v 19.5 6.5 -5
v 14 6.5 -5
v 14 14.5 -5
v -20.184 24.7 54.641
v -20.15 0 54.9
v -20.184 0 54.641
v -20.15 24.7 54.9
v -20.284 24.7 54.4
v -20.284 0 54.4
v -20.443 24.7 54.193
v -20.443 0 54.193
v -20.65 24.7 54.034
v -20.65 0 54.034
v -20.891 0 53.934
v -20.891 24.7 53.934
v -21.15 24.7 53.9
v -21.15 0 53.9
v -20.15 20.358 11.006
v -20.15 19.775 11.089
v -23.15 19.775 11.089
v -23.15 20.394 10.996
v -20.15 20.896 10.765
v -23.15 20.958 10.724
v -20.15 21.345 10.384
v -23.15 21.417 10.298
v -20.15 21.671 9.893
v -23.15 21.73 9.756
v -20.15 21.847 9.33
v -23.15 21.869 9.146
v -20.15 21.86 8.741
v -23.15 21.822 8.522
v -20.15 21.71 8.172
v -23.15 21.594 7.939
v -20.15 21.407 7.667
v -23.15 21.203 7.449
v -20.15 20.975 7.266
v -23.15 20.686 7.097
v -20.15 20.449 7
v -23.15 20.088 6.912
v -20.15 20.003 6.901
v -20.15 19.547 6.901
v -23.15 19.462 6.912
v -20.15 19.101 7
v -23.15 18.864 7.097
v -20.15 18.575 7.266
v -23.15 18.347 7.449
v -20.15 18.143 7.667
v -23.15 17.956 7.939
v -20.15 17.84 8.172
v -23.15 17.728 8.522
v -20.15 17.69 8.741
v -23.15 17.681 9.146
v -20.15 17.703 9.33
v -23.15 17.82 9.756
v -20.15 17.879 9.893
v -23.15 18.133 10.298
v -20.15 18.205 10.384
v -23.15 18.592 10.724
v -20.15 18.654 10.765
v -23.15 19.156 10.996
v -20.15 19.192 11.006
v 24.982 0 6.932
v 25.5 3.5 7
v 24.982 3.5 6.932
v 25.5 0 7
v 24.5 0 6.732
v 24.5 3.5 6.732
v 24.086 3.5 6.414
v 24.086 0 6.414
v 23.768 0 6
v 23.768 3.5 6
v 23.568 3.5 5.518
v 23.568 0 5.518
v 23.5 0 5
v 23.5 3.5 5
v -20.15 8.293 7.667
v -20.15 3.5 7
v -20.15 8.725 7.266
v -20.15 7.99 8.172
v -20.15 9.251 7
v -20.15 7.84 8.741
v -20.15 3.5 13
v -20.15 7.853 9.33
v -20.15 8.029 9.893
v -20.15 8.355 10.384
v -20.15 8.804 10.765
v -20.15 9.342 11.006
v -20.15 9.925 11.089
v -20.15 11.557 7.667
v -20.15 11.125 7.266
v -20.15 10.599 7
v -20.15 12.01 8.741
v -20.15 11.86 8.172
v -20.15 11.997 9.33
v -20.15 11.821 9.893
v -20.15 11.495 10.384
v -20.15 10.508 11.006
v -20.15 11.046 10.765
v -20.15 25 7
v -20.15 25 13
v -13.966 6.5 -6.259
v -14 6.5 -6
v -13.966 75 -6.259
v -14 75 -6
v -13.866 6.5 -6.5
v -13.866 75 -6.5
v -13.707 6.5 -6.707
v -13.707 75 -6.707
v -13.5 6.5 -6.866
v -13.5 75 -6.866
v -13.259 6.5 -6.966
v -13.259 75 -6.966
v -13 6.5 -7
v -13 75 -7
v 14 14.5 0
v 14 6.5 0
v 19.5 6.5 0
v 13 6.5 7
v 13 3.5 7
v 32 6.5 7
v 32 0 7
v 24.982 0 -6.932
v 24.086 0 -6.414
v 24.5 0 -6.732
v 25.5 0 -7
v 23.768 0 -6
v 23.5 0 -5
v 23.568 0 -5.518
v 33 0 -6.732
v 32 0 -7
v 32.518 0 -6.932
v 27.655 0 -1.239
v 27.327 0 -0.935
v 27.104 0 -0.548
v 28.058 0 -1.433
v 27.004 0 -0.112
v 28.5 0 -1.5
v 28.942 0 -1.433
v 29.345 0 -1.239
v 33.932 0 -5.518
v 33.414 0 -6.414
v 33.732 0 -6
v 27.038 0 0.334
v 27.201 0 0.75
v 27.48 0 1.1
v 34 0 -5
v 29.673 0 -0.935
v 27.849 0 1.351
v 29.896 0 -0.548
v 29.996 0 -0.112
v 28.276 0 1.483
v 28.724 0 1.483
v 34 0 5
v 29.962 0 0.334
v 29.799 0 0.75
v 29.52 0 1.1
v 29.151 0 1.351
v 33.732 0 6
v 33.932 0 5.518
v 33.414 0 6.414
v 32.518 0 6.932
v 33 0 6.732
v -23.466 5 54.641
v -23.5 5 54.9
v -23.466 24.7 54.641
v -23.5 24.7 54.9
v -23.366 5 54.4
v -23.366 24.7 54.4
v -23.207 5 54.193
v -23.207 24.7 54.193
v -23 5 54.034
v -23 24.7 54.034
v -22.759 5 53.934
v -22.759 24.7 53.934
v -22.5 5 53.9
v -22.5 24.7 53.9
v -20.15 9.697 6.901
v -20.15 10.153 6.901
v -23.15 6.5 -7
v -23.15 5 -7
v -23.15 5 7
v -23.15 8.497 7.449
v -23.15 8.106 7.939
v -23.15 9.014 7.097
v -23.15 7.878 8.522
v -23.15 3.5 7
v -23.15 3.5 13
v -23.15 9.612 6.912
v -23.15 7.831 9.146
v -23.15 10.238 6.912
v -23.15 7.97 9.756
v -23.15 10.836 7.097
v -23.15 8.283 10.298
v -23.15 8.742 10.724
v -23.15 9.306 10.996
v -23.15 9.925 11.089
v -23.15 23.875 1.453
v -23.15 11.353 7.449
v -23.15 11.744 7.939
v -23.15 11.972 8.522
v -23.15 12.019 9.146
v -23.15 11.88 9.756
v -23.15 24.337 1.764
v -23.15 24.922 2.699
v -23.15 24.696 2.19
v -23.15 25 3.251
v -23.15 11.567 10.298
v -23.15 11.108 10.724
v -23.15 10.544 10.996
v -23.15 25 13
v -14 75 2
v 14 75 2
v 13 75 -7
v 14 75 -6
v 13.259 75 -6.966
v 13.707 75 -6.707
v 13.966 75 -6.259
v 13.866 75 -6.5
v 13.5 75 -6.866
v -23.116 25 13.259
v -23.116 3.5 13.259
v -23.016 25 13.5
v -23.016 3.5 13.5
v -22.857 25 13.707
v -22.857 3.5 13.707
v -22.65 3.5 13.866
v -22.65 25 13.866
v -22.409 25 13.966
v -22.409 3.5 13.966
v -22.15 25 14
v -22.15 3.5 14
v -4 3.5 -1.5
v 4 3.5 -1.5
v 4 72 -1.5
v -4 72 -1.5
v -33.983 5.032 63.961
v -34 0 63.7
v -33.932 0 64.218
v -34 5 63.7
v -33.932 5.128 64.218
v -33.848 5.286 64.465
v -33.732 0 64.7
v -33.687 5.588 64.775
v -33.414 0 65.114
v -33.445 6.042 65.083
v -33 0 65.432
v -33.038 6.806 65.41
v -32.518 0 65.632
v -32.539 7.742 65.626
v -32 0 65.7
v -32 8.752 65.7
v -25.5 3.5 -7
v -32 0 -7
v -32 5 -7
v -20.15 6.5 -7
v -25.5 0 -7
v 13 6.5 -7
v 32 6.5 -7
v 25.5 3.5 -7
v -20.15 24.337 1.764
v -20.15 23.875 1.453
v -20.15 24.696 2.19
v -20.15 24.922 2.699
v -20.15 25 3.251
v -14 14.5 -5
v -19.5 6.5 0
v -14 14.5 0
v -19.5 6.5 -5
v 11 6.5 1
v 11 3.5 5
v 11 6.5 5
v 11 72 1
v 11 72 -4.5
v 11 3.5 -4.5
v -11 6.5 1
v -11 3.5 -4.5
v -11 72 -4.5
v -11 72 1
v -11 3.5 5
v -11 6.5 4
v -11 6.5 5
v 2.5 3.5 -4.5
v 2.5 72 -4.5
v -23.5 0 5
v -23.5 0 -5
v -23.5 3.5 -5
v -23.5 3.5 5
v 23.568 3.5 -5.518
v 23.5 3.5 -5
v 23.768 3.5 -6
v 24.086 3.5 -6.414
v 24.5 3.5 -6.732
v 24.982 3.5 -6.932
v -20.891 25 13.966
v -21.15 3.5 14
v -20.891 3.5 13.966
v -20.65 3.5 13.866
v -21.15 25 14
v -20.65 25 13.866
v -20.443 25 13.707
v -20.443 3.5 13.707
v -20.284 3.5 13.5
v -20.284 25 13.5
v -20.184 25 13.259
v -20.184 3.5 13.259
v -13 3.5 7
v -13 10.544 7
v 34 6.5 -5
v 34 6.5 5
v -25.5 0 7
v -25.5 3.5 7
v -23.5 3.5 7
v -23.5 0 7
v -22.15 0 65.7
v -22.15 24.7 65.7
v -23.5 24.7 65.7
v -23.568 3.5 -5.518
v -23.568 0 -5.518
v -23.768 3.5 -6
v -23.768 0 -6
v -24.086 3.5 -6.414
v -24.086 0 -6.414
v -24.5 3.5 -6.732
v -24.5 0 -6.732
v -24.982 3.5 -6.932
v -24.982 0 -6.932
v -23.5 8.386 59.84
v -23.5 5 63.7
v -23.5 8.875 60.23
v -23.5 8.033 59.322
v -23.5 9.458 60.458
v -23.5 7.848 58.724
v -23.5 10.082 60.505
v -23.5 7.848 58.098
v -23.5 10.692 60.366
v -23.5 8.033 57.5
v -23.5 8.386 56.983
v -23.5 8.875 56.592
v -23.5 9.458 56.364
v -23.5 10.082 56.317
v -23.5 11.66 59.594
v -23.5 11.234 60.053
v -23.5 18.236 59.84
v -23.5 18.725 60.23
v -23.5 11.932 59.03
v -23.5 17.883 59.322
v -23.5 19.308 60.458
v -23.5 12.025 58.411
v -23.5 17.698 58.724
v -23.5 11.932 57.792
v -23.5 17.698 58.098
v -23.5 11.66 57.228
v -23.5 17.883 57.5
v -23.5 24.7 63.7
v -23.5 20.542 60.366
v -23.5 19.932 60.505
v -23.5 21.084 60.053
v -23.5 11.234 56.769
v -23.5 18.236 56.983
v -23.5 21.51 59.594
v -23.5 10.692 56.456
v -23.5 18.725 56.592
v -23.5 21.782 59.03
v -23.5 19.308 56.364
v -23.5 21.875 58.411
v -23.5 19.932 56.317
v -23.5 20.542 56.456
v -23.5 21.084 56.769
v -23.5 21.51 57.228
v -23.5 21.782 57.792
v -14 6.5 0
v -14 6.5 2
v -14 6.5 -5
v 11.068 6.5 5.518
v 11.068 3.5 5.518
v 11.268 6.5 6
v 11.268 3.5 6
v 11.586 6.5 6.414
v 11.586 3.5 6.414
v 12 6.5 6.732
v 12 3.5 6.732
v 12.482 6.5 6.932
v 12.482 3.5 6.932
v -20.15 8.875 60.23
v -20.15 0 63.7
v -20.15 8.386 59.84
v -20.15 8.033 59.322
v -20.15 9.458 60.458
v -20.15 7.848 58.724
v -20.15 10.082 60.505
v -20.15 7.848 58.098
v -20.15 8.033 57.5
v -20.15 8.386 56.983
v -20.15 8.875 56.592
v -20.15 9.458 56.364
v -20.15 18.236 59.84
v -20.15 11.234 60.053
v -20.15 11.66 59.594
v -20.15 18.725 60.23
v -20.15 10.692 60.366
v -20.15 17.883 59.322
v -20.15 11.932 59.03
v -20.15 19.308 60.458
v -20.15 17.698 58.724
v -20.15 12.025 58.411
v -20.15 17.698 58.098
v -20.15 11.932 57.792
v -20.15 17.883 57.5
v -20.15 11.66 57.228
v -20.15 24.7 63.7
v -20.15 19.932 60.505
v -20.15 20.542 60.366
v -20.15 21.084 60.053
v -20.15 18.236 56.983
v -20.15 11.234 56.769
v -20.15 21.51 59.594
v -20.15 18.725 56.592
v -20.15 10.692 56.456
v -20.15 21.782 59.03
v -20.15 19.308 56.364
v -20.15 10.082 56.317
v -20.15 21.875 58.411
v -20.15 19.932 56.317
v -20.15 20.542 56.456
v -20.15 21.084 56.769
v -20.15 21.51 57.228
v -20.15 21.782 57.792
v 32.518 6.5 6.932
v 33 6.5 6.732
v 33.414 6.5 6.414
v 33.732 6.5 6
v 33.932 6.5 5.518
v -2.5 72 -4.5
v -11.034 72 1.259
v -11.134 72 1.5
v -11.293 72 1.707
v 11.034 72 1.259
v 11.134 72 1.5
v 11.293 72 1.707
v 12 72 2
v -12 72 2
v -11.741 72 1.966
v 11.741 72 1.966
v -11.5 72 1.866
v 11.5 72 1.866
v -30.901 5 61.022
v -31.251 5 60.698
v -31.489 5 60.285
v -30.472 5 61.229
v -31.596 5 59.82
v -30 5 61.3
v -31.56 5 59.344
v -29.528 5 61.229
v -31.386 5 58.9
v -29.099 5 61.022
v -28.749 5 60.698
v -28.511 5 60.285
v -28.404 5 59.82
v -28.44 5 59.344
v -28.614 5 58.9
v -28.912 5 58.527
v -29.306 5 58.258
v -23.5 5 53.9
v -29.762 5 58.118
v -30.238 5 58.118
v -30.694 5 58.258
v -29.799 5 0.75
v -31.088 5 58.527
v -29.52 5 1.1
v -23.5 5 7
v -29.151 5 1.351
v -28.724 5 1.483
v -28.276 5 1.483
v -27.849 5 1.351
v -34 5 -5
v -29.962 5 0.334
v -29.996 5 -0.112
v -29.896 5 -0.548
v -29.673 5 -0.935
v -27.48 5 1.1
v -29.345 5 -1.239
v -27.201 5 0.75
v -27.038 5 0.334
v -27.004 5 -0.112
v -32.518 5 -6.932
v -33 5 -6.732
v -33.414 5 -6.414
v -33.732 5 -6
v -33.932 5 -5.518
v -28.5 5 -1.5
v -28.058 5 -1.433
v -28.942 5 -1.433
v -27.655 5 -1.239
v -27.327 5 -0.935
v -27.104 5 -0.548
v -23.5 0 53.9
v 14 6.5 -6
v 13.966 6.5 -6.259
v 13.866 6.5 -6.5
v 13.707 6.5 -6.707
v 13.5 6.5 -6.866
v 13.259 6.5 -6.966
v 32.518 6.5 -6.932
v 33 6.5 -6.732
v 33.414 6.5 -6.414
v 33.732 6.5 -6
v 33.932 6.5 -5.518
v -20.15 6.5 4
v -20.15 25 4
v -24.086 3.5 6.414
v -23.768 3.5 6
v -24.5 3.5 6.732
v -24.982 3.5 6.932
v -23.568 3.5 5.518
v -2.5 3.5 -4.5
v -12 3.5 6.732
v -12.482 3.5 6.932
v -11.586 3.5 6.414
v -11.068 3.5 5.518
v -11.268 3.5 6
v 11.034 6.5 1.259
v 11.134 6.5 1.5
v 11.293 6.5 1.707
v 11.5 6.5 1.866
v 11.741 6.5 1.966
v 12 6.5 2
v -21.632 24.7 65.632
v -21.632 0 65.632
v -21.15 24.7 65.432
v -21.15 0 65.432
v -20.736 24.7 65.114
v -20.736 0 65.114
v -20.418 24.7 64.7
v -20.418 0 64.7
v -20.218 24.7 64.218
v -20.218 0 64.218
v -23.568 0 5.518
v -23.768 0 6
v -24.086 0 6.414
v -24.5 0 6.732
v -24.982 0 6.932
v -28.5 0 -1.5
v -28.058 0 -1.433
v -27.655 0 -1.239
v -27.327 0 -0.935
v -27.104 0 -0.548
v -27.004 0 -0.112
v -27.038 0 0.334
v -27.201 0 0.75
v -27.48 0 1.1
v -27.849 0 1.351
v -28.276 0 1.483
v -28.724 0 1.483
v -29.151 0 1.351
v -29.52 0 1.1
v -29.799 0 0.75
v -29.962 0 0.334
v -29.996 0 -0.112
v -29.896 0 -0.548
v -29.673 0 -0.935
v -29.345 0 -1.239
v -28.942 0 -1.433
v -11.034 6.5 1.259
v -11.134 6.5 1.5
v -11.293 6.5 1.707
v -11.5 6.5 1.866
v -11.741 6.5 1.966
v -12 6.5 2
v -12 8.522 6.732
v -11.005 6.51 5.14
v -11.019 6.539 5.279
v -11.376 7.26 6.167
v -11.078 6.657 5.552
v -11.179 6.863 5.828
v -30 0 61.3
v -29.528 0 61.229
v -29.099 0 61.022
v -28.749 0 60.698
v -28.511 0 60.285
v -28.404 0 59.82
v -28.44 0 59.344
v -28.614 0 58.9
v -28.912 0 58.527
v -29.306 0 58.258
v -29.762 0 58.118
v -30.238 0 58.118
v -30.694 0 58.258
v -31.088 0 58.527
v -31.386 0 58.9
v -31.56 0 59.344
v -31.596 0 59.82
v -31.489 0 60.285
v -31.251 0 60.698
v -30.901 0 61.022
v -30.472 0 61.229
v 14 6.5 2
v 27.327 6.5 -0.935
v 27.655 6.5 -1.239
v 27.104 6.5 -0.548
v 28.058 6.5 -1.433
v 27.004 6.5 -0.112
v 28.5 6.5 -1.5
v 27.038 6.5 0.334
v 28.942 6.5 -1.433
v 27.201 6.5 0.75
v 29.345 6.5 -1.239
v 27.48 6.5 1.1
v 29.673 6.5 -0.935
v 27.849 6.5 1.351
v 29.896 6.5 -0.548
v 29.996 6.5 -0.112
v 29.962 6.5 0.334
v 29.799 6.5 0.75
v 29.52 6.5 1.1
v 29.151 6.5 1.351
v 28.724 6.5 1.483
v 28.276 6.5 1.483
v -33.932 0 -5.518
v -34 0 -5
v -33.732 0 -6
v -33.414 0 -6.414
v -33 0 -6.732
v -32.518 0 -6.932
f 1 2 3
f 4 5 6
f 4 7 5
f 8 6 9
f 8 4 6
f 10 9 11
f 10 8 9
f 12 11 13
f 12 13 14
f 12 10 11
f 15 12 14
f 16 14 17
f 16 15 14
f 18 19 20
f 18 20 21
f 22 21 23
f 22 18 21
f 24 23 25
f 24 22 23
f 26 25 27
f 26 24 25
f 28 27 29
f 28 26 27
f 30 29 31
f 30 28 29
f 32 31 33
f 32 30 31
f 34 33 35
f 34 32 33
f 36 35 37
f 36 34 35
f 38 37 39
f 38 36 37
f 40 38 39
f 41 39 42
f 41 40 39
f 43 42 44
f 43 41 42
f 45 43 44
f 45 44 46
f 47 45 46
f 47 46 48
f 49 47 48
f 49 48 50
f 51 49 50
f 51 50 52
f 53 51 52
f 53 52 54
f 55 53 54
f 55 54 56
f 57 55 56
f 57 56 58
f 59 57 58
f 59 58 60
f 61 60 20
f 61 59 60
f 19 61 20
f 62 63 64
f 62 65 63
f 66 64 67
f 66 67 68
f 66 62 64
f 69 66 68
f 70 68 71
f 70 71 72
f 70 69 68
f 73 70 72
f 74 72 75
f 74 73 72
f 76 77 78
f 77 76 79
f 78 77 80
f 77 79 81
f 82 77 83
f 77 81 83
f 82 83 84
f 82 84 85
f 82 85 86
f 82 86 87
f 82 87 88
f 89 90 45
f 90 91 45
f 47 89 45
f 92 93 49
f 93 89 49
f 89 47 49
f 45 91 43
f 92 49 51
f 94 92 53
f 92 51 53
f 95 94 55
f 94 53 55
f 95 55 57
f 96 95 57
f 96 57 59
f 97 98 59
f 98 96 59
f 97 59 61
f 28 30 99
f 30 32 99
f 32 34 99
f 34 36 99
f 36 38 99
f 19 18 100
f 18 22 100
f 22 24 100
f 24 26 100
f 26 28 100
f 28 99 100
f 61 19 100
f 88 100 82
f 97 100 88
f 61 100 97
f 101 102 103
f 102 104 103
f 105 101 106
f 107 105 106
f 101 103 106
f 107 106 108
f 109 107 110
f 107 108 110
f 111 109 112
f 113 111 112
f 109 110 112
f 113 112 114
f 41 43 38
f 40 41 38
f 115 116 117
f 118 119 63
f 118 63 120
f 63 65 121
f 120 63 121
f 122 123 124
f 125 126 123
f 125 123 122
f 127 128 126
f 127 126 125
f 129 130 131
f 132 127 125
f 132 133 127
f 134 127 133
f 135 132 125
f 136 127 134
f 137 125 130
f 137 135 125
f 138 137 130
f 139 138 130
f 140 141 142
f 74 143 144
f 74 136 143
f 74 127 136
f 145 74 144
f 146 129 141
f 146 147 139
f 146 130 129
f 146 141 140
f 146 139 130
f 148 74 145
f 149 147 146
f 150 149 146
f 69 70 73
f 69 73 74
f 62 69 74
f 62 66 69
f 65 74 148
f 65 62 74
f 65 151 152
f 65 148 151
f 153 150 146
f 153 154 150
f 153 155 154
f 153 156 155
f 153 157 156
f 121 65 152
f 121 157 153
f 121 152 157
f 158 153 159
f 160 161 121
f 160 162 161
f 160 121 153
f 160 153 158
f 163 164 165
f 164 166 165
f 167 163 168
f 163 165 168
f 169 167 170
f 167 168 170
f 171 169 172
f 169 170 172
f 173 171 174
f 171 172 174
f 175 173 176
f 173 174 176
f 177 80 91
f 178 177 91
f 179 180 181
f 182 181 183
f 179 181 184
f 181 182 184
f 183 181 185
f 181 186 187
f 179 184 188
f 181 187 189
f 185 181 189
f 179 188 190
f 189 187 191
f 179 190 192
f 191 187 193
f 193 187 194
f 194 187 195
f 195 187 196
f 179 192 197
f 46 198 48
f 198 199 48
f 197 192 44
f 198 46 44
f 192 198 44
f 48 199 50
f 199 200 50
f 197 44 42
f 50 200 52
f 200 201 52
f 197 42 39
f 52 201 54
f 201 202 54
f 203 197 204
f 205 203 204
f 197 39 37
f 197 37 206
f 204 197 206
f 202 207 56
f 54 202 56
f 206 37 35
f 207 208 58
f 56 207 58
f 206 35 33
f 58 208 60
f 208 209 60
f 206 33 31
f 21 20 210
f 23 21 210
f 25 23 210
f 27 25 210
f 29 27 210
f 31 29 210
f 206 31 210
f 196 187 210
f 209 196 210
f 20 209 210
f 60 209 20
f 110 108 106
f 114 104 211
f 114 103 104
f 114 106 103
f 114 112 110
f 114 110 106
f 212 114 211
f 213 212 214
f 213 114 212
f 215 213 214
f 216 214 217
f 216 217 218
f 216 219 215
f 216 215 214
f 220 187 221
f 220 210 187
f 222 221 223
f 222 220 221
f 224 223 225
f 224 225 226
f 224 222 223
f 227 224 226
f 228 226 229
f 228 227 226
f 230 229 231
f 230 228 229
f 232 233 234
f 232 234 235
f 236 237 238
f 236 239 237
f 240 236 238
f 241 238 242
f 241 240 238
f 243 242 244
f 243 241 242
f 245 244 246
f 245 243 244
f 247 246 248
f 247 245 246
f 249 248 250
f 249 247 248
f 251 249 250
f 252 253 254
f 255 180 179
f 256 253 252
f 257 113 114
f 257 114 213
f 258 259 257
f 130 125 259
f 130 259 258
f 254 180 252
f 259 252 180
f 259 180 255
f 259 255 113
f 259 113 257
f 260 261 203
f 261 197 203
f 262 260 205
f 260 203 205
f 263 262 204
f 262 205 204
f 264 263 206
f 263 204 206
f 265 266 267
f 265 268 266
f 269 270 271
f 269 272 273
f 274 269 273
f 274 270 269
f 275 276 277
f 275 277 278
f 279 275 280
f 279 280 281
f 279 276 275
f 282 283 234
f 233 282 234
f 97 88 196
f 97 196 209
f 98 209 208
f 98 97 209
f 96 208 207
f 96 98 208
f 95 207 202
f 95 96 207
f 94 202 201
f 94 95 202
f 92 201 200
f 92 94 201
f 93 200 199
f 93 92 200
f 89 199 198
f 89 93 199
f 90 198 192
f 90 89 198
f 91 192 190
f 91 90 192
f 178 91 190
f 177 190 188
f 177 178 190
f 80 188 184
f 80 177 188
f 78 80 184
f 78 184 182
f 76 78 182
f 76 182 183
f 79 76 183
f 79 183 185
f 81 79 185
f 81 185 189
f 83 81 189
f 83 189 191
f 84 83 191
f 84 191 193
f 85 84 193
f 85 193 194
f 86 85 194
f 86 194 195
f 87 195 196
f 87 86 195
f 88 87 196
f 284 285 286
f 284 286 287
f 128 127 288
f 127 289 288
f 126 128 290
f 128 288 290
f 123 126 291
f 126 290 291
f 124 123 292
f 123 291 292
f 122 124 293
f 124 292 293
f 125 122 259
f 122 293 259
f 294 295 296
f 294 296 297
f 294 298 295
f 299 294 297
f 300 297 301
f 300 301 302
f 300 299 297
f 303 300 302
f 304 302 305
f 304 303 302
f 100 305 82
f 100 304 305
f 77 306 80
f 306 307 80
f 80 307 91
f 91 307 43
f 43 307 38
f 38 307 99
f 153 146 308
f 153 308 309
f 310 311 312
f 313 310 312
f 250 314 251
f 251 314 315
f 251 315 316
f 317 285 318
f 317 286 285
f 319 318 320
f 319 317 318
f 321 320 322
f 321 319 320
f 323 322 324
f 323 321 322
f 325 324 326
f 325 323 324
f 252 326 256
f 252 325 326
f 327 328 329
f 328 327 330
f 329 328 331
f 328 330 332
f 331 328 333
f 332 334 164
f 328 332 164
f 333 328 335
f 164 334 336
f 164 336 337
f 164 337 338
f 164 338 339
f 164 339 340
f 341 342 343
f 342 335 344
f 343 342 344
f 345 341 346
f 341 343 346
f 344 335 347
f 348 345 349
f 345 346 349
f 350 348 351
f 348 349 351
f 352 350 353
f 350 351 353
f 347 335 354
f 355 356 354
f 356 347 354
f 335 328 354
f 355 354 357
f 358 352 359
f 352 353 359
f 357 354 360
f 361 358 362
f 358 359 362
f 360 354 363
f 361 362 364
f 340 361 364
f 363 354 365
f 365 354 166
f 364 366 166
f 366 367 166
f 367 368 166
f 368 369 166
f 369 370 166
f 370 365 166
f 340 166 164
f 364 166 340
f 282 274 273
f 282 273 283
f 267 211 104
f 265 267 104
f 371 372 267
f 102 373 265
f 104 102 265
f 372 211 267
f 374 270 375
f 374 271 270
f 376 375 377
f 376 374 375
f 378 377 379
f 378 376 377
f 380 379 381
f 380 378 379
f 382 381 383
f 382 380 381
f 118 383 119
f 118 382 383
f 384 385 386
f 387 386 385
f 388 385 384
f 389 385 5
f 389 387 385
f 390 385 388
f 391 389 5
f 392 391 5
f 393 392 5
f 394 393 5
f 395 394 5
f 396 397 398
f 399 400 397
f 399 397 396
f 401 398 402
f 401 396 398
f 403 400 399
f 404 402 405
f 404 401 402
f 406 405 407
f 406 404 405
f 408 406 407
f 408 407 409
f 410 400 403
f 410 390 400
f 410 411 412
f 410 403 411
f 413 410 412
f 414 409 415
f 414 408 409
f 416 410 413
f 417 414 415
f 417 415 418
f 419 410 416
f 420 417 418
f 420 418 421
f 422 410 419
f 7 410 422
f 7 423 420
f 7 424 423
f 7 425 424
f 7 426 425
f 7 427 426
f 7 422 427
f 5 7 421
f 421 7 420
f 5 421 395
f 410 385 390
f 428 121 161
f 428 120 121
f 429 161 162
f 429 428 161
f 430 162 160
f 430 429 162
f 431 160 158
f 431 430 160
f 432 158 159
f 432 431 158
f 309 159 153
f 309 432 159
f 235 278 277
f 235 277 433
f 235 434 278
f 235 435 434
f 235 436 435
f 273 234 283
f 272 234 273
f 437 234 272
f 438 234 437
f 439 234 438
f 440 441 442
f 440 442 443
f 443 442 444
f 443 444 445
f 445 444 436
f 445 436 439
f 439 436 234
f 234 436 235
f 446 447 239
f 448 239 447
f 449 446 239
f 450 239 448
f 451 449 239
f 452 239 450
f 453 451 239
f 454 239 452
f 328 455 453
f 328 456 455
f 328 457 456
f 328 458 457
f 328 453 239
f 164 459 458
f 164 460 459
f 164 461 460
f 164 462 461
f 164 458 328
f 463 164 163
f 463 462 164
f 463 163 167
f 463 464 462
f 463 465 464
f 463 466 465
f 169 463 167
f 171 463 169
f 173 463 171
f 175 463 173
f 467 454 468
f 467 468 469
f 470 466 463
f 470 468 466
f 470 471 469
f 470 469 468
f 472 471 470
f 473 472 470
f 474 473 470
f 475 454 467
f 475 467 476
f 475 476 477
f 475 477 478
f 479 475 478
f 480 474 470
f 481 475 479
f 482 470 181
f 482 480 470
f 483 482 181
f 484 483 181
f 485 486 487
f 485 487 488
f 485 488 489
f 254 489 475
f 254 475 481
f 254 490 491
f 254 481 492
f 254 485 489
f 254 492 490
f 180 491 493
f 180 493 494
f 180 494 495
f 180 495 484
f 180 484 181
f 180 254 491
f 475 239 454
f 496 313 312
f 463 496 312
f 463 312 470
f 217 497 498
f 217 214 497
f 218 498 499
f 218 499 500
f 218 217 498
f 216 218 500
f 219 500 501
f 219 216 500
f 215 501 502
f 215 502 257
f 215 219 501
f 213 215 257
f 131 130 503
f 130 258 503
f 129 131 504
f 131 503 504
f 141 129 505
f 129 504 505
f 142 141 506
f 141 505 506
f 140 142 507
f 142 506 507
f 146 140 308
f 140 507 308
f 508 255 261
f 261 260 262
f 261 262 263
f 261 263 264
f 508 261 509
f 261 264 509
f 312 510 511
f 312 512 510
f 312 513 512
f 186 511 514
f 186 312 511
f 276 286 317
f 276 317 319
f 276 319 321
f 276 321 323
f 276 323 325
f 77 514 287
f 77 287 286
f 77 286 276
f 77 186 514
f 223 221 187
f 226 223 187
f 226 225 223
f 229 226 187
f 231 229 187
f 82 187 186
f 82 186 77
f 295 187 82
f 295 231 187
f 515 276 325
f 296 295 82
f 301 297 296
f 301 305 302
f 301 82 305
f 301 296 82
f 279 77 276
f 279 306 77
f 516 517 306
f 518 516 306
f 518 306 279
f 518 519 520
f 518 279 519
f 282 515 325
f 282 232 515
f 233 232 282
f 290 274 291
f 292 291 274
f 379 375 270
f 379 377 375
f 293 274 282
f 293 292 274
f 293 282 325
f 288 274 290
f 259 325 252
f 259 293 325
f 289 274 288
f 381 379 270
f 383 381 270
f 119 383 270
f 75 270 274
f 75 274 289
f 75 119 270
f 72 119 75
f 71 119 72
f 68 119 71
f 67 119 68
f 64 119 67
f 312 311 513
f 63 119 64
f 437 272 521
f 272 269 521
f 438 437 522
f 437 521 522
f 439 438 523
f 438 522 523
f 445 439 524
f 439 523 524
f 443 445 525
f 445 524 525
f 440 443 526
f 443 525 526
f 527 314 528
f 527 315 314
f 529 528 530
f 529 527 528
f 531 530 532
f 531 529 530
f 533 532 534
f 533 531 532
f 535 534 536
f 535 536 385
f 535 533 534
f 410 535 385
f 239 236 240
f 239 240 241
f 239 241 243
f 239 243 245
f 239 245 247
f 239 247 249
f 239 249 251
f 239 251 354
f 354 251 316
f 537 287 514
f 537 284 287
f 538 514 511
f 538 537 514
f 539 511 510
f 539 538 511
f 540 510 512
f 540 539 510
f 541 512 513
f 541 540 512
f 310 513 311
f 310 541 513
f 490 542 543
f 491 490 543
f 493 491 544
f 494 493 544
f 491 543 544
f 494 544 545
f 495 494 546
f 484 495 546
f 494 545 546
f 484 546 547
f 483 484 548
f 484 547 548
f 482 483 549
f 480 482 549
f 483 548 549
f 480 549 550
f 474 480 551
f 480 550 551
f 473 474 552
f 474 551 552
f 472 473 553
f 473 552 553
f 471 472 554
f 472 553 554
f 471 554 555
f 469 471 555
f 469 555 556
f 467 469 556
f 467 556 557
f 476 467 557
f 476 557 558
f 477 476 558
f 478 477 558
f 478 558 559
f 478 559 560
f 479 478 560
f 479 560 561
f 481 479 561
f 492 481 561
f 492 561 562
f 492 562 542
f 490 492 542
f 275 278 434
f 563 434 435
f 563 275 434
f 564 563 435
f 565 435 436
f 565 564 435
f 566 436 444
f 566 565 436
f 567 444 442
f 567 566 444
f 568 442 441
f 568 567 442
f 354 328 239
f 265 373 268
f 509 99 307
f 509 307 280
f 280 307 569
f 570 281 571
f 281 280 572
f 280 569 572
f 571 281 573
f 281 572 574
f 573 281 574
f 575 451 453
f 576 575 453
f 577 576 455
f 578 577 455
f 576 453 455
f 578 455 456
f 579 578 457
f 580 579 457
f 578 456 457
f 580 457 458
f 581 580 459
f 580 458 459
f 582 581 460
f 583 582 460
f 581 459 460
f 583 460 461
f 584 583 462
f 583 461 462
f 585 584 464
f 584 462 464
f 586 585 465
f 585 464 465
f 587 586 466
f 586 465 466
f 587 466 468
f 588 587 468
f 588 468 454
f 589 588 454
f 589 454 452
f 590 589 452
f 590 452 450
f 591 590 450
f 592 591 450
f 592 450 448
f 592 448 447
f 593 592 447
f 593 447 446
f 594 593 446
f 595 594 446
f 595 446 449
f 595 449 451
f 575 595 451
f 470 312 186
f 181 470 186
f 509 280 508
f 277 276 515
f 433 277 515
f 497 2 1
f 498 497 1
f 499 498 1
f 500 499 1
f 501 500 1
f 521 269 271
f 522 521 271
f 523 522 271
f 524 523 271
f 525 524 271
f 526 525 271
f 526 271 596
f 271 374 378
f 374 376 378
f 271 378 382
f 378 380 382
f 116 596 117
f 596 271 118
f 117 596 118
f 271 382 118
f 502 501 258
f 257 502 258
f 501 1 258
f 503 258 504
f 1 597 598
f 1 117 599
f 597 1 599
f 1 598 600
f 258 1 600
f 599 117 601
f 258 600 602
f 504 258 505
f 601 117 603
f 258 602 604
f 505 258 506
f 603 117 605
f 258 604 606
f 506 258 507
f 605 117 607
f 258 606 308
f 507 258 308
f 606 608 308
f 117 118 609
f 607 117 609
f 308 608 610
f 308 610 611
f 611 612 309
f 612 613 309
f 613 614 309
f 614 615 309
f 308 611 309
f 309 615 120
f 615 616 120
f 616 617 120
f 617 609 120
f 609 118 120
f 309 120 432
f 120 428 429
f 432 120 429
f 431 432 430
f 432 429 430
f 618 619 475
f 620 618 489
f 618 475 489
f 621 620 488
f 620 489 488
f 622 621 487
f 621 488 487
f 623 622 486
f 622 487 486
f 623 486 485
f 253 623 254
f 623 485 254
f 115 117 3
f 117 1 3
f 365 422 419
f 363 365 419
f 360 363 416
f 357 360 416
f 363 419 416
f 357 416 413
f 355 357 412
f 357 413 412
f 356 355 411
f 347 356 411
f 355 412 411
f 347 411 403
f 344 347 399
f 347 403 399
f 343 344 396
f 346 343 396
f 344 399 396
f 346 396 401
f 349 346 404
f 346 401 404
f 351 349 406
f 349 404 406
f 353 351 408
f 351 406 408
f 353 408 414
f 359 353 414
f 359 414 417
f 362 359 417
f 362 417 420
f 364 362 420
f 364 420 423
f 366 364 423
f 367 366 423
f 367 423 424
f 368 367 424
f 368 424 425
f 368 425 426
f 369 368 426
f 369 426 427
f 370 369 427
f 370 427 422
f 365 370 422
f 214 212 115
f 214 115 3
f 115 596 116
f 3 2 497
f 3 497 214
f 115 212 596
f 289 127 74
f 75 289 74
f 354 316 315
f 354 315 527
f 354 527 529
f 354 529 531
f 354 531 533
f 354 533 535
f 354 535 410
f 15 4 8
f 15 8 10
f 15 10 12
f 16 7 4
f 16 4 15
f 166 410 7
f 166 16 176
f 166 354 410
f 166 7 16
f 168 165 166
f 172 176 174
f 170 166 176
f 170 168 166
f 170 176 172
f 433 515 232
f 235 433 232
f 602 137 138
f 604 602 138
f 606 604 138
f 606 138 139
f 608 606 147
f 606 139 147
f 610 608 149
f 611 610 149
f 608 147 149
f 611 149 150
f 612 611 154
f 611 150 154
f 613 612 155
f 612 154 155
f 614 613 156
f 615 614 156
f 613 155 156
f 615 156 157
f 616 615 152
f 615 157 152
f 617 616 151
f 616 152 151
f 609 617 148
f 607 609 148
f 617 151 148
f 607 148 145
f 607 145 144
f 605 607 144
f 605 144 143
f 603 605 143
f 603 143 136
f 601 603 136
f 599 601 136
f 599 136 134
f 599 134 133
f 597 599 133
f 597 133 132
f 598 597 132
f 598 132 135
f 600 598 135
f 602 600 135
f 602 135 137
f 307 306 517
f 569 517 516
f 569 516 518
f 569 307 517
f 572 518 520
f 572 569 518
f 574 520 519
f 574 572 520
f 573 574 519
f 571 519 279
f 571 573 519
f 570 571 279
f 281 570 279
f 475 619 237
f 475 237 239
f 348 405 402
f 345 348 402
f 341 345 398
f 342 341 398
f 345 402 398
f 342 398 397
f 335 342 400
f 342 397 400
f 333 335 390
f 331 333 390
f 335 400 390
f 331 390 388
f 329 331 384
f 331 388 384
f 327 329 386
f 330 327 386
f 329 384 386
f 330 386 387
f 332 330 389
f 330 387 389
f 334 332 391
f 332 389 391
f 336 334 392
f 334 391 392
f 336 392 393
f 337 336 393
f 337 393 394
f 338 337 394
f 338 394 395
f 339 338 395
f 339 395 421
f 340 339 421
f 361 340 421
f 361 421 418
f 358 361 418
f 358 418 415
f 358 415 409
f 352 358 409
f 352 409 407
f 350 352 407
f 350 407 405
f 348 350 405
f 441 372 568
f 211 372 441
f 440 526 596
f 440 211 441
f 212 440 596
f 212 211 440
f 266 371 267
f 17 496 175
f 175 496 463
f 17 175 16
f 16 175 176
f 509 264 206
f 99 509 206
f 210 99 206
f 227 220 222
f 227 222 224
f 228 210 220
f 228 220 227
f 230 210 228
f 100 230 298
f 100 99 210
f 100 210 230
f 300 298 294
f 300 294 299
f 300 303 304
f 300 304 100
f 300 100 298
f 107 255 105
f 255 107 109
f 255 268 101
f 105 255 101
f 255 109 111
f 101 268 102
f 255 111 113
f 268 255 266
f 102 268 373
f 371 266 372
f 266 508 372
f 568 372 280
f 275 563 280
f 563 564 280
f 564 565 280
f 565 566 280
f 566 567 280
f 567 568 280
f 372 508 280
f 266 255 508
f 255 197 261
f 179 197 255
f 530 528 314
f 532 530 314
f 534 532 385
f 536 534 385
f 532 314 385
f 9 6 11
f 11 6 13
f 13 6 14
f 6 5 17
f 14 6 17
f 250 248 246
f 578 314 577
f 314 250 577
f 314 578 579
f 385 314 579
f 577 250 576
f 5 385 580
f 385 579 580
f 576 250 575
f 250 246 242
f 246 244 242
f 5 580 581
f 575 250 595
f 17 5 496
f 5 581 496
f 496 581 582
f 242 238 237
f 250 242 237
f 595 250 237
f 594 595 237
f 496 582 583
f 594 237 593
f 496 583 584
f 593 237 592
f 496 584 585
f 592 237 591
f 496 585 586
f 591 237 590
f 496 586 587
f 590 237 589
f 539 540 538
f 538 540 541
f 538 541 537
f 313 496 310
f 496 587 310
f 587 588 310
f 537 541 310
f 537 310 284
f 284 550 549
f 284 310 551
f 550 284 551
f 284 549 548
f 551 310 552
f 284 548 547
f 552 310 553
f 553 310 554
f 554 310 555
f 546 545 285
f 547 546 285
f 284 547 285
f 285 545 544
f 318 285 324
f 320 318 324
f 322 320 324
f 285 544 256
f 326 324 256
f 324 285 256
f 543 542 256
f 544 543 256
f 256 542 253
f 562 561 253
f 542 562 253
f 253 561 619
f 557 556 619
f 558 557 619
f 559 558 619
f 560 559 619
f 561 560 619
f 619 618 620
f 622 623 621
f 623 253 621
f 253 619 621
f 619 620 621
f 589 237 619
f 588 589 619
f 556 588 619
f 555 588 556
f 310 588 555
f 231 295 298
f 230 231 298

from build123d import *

# Parameters (mm, degrees)
SKETCH_1_W          = 28
SKETCH_1_H          = 14
SKETCH_1_W_2        = 22
SKETCH_1_H_2        = 8
EXTRUDE_1_DEPTH     = 75
SKETCH_2_W          = 22
SKETCH_2_H          = 8
EXTRUDE_2_DEPTH     = 3
SKETCH_3_W          = 22
SKETCH_3_H          = 11
CUT_EXTRUDE_1_DEPTH = 72
SKETCH_4_W          = 20
SKETCH_4_H          = 14
EXTRUDE_3_DEPTH     = 6.5
SKETCH_5_R          = 1.5
CUT_EXTRUDE_2_DEPTH = 83.643814046
FILLET_1_R          = 2
EXTRUDE_5_REACH     = 84.644
SKETCH_9_W          = 28
SKETCH_9_H          = 5
CUT_EXTRUDE_3_DEPTH = 68.5
FILLET_3_R          = 1
EXTRUDE_6_DEPTH     = 2.5
SKETCH_11_W         = 12
SKETCH_11_H         = 25
SKETCH_11_R         = 2.1
EXTRUDE_7_DEPTH     = 3
EXTRUDE_9_DEPTH     = 3
EXTRUDE_8_DEPTH     = 3
SKETCH_16_W         = 47
SKETCH_16_H         = 24
CUT_EXTRUDE_4_DEPTH = 3.5
FILLET_12_R         = 2
FILLET_14_R         = 2
SKETCH_17_W         = 10.5
SKETCH_17_H         = 5
EXTRUDE_10_DEPTH    = 58.7
SKETCH_18_W         = 11.8
SKETCH_18_H         = 24.7
EXTRUDE_11_DEPTH    = 3.35
CUT_EXTRUDE_5_REACH = 115.462
SKETCH_19_R         = 2.1
CUT_EXTRUDE_6_REACH = 103.845
SKETCH_20_R         = 1.6
CUT_EXTRUDE_7_REACH = 103.127
SKETCH_21_W         = 10.85
SKETCH_21_H         = 1.5
EXTRUDE_12_DEPTH    = 2
FILLET_15_R         = 2
FILLET_16_R         = 1
CUT_EXTRUDE_8_DEPTH = 68.5


with BuildPart() as part:
    # 草图1 → 凸台-拉伸1 (new body)
    with BuildSketch(Plane(origin=(0, 0, 0), x_dir=(1, 0, 0), z_dir=(0, 1, 0))):
        Rectangle(SKETCH_1_W, SKETCH_1_H)
        Rectangle(SKETCH_1_W_2, SKETCH_1_H_2, mode=Mode.SUBTRACT)
    extrude(amount=EXTRUDE_1_DEPTH)

    # 草图2 → 凸台-拉伸2 (add)
    with BuildSketch(Plane(origin=(0, 75, 0), x_dir=(1, 0, 0), z_dir=(0, 1, 0))):
        Rectangle(SKETCH_2_W, SKETCH_2_H)
    extrude(amount=-EXTRUDE_2_DEPTH)

    # 草图3 → 切除-拉伸1 (cut)
    with BuildSketch(Plane.XZ):
        with Locations((0, 1.5)):
            Rectangle(SKETCH_3_W, SKETCH_3_H)
    extrude(amount=-CUT_EXTRUDE_1_DEPTH, mode=Mode.SUBTRACT)

    # 草图4 → 凸台-拉伸3 (add)
    with BuildSketch(Plane.XZ):
        with Locations((-24, 0)):
            Rectangle(SKETCH_4_W, SKETCH_4_H)
        with Locations((24, 0)):
            Rectangle(SKETCH_4_W, SKETCH_4_H)
    extrude(amount=-EXTRUDE_3_DEPTH)

    # 草图5 → 切除-拉伸2 (cut, through all)
    with BuildSketch(Plane.XZ):
        with Locations(Location((-28.5, 0, 0), (0, 0, 270))):
            Circle(SKETCH_5_R)
        with Locations(Location((28.5, 0, 0), (0, 0, 270))):
            Circle(SKETCH_5_R)
    extrude(amount=-CUT_EXTRUDE_2_DEPTH, mode=Mode.SUBTRACT)

    # 圆角1
    fillet_1_edges = [part.edges().sort_by_distance(p)[0] for p in [
        (-34, 3.25, -7),
        (34, 3.25, 7),
        (34, 3.25, -7),
    ]]
    fillet(fillet_1_edges, radius=FILLET_1_R)

    # 草图7 → 凸台-拉伸5 (add, up to next)
    with BuildSketch(Plane.XZ, mode=Mode.PRIVATE) as extrude_5_sk1:
        Polygon((-2.5, -4.5), (2.5, -4.5), (4, -1.5), (-4, -1.5), align=None)
    extrude_5_tool1 = extrude(extrude_5_sk1.sketch, amount=-EXTRUDE_5_REACH, mode=Mode.PRIVATE) - part.part
    add(extrude_5_tool1.solids().sort_by_distance((0, 0, -2.884615))[0])

    # 草图9 → 切除-拉伸3 (cut)
    with BuildSketch(Plane(origin=(0, 75, 0), x_dir=(1, 0, 0), z_dir=(0, 1, 0))):
        with Locations((0, -4.5)):
            Rectangle(SKETCH_9_W, SKETCH_9_H)
    extrude(amount=-CUT_EXTRUDE_3_DEPTH, mode=Mode.SUBTRACT)

    # 圆角3
    fillet_3_edges = [part.edges().sort_by_distance(p)[0] for p in [
        (11, 39.25, 2),
        (-11, 39.25, 2),
        (-14, 40.75, -7),
        (14, 40.75, -7),
    ]]
    fillet(fillet_3_edges, radius=FILLET_3_R)

    # 草图10 → 凸台-拉伸6 (add, symmetric)
    with BuildSketch(Plane(origin=(0, 0, -2.5), x_dir=(-1, 0, 0), z_dir=(0, 0, -1))):
        Polygon((-14, 6.5), (-19.5, 6.5), (-14, 14.5), align=None)
    extrude_6 = extrude(amount=EXTRUDE_6_DEPTH, both=True)

    # 镜向2: 凸台-拉伸6 across plane
    add(extrude_6.mirror(Plane(origin=(0, 0, 0), x_dir=(0, 0, 1), z_dir=(1, 0, 0))))

    # 草图11 → 凸台-拉伸7 (add)
    with BuildSketch(Plane.ZY.offset(20.15)):
        with Locations((8, 12.5)):
            Rectangle(SKETCH_11_W, SKETCH_11_H)
        with Locations((8.988854382, 19.775)):
            Circle(SKETCH_11_R, mode=Mode.SUBTRACT)
        with Locations((8.988854382, 9.925)):
            Circle(SKETCH_11_R, mode=Mode.SUBTRACT)
    extrude(amount=EXTRUDE_7_DEPTH)

    # 草图14 → 凸台-拉伸9 (add)
    with BuildSketch(Plane.ZY.offset(23.15)):
        Polygon((2, 25), (-7, 6.5), (2, 6.5), align=None)
    extrude(amount=-EXTRUDE_9_DEPTH)

    # 草图12 → 凸台-拉伸8 (add)
    with BuildSketch(Plane.XY.offset(7)):
        Polygon((-20.15, 6.5), (-20.15, 25), (-11, 6.5), align=None)
    extrude(amount=-EXTRUDE_8_DEPTH)

    # 草图16 → 切除-拉伸4 (cut)
    with BuildSketch(Plane.XZ):
        with Locations((0, 5)):
            Rectangle(SKETCH_16_W, SKETCH_16_H)
    extrude(amount=-CUT_EXTRUDE_4_DEPTH, mode=Mode.SUBTRACT)

    # 圆角12
    fillet_12_edges = [part.edges().sort_by_distance(p)[0] for p in [
        (-11, 5, 7),
        (11, 5, 7),
        (-23.5, 1.75, 7),
        (-23.5, 1.75, -7),
        (23.5, 1.75, 7),
        (23.5, 1.75, -7),
    ]]
    fillet(fillet_12_edges, radius=FILLET_12_R)

    # 圆角14
    fillet_14_edges = [part.edges().sort_by_distance(p)[0] for p in [
        (-21.65, 25, 2),
    ]]
    fillet(fillet_14_edges, radius=FILLET_14_R)

    # 草图17 → 凸台-拉伸10 (add)
    with BuildSketch(Plane.XY.offset(7)):
        with Locations((-28.75, 2.5)):
            Rectangle(SKETCH_17_W, SKETCH_17_H)
    extrude(amount=EXTRUDE_10_DEPTH)

    # 草图18 → 凸台-拉伸11 (add)
    with BuildSketch(Plane(origin=(-23.5, 0, 0), x_dir=(0, 0, -1), z_dir=(1, 0, 0))):
        with Locations((-59.8, 12.35)):
            Rectangle(SKETCH_18_W, SKETCH_18_H)
    extrude(amount=EXTRUDE_11_DEPTH)

    # 草图19 → 切除-拉伸5 (cut, up to next)
    with BuildSketch(Plane(origin=(-20.15, 0, 0), x_dir=(0, 0, -1), z_dir=(1, 0, 0)), mode=Mode.PRIVATE) as cut_extrude_5_sk1:
        with Locations(Location((-58.411145618, 9.925, 0), (0, 0, 90))):
            Circle(SKETCH_19_R)
    cut_extrude_5_tool1 = extrude(cut_extrude_5_sk1.sketch, amount=-CUT_EXTRUDE_5_REACH, mode=Mode.PRIVATE) & part.part
    # 草图19 → 切除-拉伸5 (cut, up to next)
    with BuildSketch(Plane(origin=(-20.15, 0, 0), x_dir=(0, 0, -1), z_dir=(1, 0, 0)), mode=Mode.PRIVATE) as cut_extrude_5_sk2:
        with Locations(Location((-58.411145618, 19.775, 0), (0, 0, 90))):
            Circle(SKETCH_19_R)
    cut_extrude_5_tool2 = extrude(cut_extrude_5_sk2.sketch, amount=-CUT_EXTRUDE_5_REACH, mode=Mode.PRIVATE) & part.part
    add(cut_extrude_5_tool1.solids().sort_by_distance((-20.15, 9.925, 58.411146))[0], mode=Mode.SUBTRACT)
    add(cut_extrude_5_tool2.solids().sort_by_distance((-20.15, 19.775, 58.411146))[0], mode=Mode.SUBTRACT)

    # 草图20 → 切除-拉伸6 (cut, up to next)
    with BuildSketch(Plane(origin=(0, 5, 0), x_dir=(1, 0, 0), z_dir=(0, 1, 0)), mode=Mode.PRIVATE) as cut_extrude_6_sk1:
        with Locations(Location((-30, -59.7, 0), (0, 0, 270))):
            Circle(SKETCH_20_R)
    cut_extrude_6_tool1 = extrude(cut_extrude_6_sk1.sketch, amount=-CUT_EXTRUDE_6_REACH, mode=Mode.PRIVATE) & part.part
    add(cut_extrude_6_tool1.solids().sort_by_distance((-30, 5, 59.7))[0], mode=Mode.SUBTRACT)

    # 草图21 → 切除-拉伸7 (cut, up to next)
    with BuildSketch(Plane.XY.offset(7), mode=Mode.PRIVATE) as cut_extrude_7_sk1:
        with Locations((-28.575, 5.75)):
            Rectangle(SKETCH_21_W, SKETCH_21_H)
    cut_extrude_7_tool1 = extrude(cut_extrude_7_sk1.sketch, amount=-CUT_EXTRUDE_7_REACH, mode=Mode.PRIVATE) & part.part
    add(cut_extrude_7_tool1.solids().sort_by_distance((-28.575, 5.75, 7))[0], mode=Mode.SUBTRACT)

    # 草图22 → 凸台-拉伸12 (add)
    with BuildSketch(Plane.XY.offset(65.7)):
        Polygon((-23.5, 5), (-34, 5), (-23.5, 24.7), align=None)
    extrude(amount=-EXTRUDE_12_DEPTH)

    # 圆角15
    fillet_15_edges = [part.edges().sort_by_distance(p)[0] for p in [
        (-34, 2.5, 65.7),
        (-20.15, 12.35, 65.7),
    ]]
    fillet(fillet_15_edges, radius=FILLET_15_R)

    # 圆角16
    fillet_16_edges = [part.edges().sort_by_distance(p)[0] for p in [
        (-20.15, 14.25, 14),
        (-23.15, 14.25, 14),
        (-23.5, 14.85, 53.9),
        (-20.15, 12.35, 53.9),
    ]]
    fillet(fillet_16_edges, radius=FILLET_16_R)

    # 草图23 → 切除-拉伸8 (cut)
    with BuildSketch(Plane.XZ.offset(-3.5)):
        Polygon((-11, -4), (-11, -4.5), (-2.5, -4.5), (-2.75, -4), align=None)
        Polygon((11, -4), (11, -4.5), (2.5, -4.5), (2.75, -4), align=None)
    extrude(amount=-CUT_EXTRUDE_8_DEPTH, mode=Mode.SUBTRACT)


solid = part.part
